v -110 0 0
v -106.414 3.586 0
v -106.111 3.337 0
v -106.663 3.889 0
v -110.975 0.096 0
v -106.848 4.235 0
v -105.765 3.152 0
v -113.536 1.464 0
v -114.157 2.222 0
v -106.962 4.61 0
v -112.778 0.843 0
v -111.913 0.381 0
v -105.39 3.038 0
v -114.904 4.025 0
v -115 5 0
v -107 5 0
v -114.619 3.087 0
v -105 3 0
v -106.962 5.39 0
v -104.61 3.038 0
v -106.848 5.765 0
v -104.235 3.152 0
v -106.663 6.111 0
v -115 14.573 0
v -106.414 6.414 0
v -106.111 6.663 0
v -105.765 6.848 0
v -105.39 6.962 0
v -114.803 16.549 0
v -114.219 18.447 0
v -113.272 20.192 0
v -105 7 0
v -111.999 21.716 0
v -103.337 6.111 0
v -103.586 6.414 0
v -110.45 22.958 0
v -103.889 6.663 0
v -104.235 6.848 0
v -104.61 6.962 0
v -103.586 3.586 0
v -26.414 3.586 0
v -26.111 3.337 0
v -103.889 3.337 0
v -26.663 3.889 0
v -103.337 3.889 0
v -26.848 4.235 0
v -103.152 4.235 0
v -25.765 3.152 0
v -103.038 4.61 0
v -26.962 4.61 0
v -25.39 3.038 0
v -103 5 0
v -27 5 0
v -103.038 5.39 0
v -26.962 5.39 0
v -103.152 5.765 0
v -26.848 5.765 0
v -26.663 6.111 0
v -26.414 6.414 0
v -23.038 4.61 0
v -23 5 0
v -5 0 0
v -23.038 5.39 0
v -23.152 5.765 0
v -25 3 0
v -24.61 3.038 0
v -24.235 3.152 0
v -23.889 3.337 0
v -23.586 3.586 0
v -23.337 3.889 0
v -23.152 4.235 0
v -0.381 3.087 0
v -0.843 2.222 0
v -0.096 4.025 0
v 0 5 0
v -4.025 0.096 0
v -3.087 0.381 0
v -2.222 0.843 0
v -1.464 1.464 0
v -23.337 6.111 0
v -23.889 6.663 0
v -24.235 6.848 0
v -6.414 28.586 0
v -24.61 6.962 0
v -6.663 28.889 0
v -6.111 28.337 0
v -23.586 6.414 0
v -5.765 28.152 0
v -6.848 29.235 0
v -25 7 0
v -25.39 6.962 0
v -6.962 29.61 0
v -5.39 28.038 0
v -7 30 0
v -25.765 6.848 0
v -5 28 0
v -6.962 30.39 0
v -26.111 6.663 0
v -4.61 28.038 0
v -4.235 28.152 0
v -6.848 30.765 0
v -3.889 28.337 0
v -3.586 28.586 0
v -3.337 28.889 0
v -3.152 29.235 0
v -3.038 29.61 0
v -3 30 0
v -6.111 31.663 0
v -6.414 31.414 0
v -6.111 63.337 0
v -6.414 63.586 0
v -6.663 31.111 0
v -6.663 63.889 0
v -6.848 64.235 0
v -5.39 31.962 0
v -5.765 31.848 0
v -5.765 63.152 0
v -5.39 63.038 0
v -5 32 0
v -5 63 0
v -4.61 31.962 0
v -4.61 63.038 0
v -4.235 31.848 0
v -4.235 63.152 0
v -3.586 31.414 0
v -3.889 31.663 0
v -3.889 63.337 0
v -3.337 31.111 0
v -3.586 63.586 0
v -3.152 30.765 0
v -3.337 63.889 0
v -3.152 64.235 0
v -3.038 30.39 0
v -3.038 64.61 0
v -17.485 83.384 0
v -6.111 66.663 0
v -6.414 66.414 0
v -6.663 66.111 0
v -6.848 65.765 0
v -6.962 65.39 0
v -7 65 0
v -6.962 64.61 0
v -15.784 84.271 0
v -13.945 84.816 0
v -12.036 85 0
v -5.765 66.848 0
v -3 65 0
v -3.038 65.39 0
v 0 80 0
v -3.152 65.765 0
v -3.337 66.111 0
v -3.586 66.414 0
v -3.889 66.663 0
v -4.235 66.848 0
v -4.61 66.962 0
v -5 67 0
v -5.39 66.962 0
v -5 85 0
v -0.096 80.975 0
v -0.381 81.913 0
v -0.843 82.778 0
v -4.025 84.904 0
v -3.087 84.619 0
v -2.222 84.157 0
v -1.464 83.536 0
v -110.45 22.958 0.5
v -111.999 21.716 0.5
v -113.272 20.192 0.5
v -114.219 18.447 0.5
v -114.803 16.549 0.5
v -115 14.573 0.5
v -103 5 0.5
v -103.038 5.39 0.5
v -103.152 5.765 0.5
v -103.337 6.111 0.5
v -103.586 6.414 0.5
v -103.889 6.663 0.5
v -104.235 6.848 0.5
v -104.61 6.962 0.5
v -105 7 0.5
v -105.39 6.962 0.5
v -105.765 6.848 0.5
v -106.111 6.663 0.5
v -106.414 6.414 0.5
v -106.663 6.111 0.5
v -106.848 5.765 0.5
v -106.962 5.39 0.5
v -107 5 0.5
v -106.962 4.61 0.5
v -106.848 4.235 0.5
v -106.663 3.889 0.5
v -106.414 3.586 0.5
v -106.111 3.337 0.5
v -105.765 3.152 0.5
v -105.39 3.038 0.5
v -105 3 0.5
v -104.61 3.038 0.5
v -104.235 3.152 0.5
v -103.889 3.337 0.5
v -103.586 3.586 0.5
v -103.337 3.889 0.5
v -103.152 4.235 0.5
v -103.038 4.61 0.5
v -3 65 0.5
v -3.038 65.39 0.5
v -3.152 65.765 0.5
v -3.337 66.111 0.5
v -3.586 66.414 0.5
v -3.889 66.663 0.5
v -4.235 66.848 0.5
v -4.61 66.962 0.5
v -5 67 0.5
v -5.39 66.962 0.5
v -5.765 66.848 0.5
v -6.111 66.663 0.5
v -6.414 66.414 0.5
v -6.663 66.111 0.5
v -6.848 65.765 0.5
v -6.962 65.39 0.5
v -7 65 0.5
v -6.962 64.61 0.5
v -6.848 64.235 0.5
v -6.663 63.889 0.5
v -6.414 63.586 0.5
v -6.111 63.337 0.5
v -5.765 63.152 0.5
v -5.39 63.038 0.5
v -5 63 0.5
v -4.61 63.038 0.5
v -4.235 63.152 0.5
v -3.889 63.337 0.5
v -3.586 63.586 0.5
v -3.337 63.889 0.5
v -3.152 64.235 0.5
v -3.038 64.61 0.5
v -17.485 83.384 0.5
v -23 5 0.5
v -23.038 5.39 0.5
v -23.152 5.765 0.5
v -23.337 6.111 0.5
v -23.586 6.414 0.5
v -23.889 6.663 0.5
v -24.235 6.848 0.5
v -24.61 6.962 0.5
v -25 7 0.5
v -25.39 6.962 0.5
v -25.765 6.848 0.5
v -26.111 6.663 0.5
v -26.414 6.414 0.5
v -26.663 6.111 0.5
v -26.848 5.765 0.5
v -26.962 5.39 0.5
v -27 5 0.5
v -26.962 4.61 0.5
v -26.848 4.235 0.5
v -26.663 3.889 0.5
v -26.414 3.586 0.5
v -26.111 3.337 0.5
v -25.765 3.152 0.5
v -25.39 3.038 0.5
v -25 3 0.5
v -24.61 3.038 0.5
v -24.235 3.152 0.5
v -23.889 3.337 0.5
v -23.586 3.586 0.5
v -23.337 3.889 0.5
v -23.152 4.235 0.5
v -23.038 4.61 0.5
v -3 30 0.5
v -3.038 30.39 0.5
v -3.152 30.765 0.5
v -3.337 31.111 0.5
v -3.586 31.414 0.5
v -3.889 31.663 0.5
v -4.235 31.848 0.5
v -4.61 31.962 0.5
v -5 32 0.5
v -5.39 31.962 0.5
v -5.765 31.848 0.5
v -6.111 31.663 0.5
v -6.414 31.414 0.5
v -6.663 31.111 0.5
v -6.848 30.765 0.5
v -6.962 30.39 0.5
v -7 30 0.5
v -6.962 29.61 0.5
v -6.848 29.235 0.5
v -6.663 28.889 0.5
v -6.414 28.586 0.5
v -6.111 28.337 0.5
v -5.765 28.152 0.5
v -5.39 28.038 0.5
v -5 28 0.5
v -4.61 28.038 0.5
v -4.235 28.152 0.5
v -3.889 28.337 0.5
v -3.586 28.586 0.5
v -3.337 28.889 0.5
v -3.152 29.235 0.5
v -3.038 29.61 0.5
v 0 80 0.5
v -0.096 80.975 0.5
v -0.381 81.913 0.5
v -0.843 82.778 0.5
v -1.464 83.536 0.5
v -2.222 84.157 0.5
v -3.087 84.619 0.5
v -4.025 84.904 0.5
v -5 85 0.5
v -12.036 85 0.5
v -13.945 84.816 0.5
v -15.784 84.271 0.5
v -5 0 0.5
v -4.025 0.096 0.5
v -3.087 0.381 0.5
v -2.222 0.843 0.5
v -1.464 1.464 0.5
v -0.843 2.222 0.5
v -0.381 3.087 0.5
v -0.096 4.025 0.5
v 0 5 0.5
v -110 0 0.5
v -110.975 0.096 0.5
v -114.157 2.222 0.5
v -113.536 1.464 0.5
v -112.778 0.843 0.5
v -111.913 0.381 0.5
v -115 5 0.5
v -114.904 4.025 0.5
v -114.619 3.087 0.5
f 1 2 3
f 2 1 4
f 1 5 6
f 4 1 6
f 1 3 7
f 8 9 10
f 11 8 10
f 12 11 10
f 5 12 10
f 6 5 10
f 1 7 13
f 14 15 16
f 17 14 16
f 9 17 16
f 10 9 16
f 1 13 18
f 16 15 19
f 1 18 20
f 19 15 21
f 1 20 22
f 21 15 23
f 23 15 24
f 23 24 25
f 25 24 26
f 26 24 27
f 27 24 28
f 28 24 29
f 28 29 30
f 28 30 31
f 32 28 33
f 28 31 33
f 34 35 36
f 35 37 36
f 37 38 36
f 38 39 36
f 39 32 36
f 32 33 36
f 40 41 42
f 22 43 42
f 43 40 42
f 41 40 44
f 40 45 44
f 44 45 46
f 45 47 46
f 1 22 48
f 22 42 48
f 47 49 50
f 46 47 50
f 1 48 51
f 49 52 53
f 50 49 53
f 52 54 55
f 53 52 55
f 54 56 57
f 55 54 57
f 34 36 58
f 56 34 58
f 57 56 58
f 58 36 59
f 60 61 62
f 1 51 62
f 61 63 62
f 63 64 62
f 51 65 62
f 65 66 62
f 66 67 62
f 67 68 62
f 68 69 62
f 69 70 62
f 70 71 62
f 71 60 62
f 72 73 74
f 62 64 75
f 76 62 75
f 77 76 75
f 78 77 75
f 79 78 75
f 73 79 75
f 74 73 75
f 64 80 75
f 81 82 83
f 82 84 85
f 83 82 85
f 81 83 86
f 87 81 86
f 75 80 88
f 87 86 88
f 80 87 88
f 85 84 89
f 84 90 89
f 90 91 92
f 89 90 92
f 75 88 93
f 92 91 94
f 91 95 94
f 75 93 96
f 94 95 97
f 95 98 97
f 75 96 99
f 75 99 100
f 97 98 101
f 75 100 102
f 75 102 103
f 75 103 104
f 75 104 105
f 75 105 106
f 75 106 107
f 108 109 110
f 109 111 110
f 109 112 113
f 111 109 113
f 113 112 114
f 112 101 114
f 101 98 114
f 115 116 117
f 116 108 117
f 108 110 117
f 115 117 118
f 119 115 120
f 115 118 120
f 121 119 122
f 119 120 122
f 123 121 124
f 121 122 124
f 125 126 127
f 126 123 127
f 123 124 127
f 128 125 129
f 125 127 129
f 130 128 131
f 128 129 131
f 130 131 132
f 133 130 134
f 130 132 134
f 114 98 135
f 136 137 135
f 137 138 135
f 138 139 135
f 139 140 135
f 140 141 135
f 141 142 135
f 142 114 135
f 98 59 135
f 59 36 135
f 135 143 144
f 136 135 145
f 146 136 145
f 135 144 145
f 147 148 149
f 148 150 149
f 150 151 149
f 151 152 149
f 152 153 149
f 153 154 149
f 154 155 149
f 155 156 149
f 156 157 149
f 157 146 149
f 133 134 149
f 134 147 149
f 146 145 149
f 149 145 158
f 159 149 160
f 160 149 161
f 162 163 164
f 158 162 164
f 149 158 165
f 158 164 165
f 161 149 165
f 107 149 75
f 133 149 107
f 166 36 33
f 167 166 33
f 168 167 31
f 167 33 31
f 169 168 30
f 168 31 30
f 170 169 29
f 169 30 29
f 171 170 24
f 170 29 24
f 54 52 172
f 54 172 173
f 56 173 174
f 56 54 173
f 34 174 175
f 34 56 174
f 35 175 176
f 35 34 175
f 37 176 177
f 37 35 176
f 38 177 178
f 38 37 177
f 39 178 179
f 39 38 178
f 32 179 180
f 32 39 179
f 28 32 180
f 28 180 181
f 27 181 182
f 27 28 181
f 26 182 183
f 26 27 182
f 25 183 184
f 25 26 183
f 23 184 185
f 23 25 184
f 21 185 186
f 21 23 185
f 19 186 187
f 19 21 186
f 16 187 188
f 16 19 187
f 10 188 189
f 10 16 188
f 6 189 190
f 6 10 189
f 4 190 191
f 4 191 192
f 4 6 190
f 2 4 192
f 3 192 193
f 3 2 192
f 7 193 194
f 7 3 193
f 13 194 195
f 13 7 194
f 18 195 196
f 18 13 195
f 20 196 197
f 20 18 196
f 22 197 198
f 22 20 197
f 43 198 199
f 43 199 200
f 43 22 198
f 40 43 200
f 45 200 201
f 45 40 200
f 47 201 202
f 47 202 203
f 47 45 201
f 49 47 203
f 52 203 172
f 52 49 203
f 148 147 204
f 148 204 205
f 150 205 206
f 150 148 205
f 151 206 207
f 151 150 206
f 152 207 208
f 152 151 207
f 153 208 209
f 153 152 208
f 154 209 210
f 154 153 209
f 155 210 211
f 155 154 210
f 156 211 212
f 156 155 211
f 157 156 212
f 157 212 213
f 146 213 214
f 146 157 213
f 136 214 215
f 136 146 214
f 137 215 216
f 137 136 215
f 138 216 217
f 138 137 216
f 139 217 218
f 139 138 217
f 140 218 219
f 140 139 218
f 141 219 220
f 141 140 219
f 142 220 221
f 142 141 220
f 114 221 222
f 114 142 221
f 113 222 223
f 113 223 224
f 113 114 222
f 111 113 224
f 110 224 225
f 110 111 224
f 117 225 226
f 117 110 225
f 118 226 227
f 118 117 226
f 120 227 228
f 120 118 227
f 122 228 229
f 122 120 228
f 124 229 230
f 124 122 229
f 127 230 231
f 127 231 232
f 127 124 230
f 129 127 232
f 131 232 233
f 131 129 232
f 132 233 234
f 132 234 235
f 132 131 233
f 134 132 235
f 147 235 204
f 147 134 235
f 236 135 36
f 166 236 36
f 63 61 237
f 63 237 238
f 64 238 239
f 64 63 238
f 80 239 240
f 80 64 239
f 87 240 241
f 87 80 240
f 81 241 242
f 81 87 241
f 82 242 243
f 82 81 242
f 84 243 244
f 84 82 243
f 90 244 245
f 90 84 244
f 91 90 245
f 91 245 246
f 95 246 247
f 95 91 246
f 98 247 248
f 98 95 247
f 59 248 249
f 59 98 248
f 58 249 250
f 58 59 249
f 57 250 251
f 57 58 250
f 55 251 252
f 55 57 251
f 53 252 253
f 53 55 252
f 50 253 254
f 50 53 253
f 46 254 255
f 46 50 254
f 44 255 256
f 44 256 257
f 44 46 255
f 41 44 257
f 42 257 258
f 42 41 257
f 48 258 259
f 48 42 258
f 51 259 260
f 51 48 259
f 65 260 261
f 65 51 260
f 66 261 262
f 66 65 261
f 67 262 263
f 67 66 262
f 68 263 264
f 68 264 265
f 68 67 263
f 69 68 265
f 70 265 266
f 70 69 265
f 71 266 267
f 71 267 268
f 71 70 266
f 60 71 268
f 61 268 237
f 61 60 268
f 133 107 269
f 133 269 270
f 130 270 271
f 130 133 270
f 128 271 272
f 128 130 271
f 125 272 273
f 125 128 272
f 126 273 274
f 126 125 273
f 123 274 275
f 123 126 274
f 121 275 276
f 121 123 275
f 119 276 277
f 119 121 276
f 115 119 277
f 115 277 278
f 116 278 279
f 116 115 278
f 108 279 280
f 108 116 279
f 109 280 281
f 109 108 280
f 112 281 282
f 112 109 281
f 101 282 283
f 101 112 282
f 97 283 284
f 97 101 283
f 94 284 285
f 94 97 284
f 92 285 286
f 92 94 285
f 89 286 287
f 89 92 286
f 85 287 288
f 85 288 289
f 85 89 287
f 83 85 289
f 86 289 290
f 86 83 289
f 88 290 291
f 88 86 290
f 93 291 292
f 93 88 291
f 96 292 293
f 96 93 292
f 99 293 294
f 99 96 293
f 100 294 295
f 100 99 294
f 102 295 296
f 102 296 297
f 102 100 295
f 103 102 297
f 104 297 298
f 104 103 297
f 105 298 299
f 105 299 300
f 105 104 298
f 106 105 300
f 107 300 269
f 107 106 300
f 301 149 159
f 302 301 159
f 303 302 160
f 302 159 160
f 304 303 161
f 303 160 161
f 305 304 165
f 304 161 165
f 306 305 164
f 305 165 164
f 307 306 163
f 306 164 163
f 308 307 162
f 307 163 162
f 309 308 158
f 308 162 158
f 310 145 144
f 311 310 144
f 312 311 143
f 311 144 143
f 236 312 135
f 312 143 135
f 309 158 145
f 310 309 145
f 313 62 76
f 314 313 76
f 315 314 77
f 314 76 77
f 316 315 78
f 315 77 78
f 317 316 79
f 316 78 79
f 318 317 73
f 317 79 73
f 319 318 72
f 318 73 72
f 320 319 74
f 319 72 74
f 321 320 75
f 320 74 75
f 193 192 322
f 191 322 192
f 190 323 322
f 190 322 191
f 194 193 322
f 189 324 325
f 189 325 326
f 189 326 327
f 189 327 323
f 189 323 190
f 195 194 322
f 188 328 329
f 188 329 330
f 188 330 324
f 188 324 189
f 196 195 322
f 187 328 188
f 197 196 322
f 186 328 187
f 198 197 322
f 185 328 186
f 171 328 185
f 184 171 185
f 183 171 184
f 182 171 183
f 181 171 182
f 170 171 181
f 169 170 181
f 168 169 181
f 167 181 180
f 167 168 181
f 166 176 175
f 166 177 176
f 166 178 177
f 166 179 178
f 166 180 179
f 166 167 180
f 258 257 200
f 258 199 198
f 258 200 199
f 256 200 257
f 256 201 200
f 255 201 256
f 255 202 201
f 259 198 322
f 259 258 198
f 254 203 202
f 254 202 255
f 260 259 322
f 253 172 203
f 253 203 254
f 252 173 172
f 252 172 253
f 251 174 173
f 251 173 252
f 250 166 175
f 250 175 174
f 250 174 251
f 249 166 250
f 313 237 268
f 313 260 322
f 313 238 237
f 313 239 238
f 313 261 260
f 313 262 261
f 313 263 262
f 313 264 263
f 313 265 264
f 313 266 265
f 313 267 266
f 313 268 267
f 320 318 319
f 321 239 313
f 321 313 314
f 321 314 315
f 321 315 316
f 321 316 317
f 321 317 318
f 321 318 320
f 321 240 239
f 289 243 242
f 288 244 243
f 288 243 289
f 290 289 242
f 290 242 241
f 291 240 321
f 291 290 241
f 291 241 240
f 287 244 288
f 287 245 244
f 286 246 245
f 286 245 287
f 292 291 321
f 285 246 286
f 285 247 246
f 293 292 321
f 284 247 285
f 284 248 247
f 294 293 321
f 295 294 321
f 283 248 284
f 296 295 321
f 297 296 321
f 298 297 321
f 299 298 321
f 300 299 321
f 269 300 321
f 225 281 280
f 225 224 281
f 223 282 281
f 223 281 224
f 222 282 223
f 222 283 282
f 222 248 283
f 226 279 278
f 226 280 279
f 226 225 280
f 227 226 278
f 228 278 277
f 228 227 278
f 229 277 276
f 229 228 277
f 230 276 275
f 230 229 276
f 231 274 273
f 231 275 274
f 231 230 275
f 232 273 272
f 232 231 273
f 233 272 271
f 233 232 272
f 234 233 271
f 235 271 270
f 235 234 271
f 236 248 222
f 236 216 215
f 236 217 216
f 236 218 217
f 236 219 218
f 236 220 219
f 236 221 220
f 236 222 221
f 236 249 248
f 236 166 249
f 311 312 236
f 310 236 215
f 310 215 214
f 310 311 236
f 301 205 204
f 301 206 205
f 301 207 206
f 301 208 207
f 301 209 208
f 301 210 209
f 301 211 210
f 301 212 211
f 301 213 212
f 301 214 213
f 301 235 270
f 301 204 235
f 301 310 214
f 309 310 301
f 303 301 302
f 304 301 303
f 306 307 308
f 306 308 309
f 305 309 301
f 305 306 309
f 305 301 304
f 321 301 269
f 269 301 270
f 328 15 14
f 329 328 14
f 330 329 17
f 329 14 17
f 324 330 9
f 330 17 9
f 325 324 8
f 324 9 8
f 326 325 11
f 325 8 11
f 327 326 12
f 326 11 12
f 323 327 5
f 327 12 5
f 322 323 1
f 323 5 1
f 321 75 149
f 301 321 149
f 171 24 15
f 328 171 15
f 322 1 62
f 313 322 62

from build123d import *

# Parameters (mm, degrees)
SKETCH1_R           = 2
BOSS_EXTRUDE1_DEPTH = 0.5


with BuildPart() as part:
    # Sketch1 → Boss-Extrude1 (new body)
    with BuildSketch(Plane.XY):
        with BuildLine():
            Line((0, 5), (0, 80))
            ThreePointArc((0, 80), (-1.464466094, 83.535533906), (-5, 85))
            Line((-5, 85), (-12.03559932, 85))
            ThreePointArc((-12.03559932, 85), (-14.877749771, 84.587605583), (-17.485482826, 83.384436163))
            Line((-17.485482826, 83.384436163), (-110.449883506, 22.957575721))
            ThreePointArc((-110.449883506, 22.957575721), (-113.78916478, 19.342896624), (-115, 14.573139558))
            Line((-115, 14.573139558), (-115, 5))
            ThreePointArc((-115, 5), (-113.535533906, 1.464466094), (-110, 0))
            Line((-110, 0), (-5, 0))
            ThreePointArc((-5, 0), (-1.464466094, 1.464466094), (0, 5))
        make_face()
        with Locations((-105, 5)):
            Circle(SKETCH1_R, mode=Mode.SUBTRACT)
        with Locations((-25, 5)):
            Circle(SKETCH1_R, mode=Mode.SUBTRACT)
        with Locations((-5, 30)):
            Circle(SKETCH1_R, mode=Mode.SUBTRACT)
        with Locations((-5, 65)):
            Circle(SKETCH1_R, mode=Mode.SUBTRACT)
    extrude(amount=BOSS_EXTRUDE1_DEPTH)


solid = part.part
